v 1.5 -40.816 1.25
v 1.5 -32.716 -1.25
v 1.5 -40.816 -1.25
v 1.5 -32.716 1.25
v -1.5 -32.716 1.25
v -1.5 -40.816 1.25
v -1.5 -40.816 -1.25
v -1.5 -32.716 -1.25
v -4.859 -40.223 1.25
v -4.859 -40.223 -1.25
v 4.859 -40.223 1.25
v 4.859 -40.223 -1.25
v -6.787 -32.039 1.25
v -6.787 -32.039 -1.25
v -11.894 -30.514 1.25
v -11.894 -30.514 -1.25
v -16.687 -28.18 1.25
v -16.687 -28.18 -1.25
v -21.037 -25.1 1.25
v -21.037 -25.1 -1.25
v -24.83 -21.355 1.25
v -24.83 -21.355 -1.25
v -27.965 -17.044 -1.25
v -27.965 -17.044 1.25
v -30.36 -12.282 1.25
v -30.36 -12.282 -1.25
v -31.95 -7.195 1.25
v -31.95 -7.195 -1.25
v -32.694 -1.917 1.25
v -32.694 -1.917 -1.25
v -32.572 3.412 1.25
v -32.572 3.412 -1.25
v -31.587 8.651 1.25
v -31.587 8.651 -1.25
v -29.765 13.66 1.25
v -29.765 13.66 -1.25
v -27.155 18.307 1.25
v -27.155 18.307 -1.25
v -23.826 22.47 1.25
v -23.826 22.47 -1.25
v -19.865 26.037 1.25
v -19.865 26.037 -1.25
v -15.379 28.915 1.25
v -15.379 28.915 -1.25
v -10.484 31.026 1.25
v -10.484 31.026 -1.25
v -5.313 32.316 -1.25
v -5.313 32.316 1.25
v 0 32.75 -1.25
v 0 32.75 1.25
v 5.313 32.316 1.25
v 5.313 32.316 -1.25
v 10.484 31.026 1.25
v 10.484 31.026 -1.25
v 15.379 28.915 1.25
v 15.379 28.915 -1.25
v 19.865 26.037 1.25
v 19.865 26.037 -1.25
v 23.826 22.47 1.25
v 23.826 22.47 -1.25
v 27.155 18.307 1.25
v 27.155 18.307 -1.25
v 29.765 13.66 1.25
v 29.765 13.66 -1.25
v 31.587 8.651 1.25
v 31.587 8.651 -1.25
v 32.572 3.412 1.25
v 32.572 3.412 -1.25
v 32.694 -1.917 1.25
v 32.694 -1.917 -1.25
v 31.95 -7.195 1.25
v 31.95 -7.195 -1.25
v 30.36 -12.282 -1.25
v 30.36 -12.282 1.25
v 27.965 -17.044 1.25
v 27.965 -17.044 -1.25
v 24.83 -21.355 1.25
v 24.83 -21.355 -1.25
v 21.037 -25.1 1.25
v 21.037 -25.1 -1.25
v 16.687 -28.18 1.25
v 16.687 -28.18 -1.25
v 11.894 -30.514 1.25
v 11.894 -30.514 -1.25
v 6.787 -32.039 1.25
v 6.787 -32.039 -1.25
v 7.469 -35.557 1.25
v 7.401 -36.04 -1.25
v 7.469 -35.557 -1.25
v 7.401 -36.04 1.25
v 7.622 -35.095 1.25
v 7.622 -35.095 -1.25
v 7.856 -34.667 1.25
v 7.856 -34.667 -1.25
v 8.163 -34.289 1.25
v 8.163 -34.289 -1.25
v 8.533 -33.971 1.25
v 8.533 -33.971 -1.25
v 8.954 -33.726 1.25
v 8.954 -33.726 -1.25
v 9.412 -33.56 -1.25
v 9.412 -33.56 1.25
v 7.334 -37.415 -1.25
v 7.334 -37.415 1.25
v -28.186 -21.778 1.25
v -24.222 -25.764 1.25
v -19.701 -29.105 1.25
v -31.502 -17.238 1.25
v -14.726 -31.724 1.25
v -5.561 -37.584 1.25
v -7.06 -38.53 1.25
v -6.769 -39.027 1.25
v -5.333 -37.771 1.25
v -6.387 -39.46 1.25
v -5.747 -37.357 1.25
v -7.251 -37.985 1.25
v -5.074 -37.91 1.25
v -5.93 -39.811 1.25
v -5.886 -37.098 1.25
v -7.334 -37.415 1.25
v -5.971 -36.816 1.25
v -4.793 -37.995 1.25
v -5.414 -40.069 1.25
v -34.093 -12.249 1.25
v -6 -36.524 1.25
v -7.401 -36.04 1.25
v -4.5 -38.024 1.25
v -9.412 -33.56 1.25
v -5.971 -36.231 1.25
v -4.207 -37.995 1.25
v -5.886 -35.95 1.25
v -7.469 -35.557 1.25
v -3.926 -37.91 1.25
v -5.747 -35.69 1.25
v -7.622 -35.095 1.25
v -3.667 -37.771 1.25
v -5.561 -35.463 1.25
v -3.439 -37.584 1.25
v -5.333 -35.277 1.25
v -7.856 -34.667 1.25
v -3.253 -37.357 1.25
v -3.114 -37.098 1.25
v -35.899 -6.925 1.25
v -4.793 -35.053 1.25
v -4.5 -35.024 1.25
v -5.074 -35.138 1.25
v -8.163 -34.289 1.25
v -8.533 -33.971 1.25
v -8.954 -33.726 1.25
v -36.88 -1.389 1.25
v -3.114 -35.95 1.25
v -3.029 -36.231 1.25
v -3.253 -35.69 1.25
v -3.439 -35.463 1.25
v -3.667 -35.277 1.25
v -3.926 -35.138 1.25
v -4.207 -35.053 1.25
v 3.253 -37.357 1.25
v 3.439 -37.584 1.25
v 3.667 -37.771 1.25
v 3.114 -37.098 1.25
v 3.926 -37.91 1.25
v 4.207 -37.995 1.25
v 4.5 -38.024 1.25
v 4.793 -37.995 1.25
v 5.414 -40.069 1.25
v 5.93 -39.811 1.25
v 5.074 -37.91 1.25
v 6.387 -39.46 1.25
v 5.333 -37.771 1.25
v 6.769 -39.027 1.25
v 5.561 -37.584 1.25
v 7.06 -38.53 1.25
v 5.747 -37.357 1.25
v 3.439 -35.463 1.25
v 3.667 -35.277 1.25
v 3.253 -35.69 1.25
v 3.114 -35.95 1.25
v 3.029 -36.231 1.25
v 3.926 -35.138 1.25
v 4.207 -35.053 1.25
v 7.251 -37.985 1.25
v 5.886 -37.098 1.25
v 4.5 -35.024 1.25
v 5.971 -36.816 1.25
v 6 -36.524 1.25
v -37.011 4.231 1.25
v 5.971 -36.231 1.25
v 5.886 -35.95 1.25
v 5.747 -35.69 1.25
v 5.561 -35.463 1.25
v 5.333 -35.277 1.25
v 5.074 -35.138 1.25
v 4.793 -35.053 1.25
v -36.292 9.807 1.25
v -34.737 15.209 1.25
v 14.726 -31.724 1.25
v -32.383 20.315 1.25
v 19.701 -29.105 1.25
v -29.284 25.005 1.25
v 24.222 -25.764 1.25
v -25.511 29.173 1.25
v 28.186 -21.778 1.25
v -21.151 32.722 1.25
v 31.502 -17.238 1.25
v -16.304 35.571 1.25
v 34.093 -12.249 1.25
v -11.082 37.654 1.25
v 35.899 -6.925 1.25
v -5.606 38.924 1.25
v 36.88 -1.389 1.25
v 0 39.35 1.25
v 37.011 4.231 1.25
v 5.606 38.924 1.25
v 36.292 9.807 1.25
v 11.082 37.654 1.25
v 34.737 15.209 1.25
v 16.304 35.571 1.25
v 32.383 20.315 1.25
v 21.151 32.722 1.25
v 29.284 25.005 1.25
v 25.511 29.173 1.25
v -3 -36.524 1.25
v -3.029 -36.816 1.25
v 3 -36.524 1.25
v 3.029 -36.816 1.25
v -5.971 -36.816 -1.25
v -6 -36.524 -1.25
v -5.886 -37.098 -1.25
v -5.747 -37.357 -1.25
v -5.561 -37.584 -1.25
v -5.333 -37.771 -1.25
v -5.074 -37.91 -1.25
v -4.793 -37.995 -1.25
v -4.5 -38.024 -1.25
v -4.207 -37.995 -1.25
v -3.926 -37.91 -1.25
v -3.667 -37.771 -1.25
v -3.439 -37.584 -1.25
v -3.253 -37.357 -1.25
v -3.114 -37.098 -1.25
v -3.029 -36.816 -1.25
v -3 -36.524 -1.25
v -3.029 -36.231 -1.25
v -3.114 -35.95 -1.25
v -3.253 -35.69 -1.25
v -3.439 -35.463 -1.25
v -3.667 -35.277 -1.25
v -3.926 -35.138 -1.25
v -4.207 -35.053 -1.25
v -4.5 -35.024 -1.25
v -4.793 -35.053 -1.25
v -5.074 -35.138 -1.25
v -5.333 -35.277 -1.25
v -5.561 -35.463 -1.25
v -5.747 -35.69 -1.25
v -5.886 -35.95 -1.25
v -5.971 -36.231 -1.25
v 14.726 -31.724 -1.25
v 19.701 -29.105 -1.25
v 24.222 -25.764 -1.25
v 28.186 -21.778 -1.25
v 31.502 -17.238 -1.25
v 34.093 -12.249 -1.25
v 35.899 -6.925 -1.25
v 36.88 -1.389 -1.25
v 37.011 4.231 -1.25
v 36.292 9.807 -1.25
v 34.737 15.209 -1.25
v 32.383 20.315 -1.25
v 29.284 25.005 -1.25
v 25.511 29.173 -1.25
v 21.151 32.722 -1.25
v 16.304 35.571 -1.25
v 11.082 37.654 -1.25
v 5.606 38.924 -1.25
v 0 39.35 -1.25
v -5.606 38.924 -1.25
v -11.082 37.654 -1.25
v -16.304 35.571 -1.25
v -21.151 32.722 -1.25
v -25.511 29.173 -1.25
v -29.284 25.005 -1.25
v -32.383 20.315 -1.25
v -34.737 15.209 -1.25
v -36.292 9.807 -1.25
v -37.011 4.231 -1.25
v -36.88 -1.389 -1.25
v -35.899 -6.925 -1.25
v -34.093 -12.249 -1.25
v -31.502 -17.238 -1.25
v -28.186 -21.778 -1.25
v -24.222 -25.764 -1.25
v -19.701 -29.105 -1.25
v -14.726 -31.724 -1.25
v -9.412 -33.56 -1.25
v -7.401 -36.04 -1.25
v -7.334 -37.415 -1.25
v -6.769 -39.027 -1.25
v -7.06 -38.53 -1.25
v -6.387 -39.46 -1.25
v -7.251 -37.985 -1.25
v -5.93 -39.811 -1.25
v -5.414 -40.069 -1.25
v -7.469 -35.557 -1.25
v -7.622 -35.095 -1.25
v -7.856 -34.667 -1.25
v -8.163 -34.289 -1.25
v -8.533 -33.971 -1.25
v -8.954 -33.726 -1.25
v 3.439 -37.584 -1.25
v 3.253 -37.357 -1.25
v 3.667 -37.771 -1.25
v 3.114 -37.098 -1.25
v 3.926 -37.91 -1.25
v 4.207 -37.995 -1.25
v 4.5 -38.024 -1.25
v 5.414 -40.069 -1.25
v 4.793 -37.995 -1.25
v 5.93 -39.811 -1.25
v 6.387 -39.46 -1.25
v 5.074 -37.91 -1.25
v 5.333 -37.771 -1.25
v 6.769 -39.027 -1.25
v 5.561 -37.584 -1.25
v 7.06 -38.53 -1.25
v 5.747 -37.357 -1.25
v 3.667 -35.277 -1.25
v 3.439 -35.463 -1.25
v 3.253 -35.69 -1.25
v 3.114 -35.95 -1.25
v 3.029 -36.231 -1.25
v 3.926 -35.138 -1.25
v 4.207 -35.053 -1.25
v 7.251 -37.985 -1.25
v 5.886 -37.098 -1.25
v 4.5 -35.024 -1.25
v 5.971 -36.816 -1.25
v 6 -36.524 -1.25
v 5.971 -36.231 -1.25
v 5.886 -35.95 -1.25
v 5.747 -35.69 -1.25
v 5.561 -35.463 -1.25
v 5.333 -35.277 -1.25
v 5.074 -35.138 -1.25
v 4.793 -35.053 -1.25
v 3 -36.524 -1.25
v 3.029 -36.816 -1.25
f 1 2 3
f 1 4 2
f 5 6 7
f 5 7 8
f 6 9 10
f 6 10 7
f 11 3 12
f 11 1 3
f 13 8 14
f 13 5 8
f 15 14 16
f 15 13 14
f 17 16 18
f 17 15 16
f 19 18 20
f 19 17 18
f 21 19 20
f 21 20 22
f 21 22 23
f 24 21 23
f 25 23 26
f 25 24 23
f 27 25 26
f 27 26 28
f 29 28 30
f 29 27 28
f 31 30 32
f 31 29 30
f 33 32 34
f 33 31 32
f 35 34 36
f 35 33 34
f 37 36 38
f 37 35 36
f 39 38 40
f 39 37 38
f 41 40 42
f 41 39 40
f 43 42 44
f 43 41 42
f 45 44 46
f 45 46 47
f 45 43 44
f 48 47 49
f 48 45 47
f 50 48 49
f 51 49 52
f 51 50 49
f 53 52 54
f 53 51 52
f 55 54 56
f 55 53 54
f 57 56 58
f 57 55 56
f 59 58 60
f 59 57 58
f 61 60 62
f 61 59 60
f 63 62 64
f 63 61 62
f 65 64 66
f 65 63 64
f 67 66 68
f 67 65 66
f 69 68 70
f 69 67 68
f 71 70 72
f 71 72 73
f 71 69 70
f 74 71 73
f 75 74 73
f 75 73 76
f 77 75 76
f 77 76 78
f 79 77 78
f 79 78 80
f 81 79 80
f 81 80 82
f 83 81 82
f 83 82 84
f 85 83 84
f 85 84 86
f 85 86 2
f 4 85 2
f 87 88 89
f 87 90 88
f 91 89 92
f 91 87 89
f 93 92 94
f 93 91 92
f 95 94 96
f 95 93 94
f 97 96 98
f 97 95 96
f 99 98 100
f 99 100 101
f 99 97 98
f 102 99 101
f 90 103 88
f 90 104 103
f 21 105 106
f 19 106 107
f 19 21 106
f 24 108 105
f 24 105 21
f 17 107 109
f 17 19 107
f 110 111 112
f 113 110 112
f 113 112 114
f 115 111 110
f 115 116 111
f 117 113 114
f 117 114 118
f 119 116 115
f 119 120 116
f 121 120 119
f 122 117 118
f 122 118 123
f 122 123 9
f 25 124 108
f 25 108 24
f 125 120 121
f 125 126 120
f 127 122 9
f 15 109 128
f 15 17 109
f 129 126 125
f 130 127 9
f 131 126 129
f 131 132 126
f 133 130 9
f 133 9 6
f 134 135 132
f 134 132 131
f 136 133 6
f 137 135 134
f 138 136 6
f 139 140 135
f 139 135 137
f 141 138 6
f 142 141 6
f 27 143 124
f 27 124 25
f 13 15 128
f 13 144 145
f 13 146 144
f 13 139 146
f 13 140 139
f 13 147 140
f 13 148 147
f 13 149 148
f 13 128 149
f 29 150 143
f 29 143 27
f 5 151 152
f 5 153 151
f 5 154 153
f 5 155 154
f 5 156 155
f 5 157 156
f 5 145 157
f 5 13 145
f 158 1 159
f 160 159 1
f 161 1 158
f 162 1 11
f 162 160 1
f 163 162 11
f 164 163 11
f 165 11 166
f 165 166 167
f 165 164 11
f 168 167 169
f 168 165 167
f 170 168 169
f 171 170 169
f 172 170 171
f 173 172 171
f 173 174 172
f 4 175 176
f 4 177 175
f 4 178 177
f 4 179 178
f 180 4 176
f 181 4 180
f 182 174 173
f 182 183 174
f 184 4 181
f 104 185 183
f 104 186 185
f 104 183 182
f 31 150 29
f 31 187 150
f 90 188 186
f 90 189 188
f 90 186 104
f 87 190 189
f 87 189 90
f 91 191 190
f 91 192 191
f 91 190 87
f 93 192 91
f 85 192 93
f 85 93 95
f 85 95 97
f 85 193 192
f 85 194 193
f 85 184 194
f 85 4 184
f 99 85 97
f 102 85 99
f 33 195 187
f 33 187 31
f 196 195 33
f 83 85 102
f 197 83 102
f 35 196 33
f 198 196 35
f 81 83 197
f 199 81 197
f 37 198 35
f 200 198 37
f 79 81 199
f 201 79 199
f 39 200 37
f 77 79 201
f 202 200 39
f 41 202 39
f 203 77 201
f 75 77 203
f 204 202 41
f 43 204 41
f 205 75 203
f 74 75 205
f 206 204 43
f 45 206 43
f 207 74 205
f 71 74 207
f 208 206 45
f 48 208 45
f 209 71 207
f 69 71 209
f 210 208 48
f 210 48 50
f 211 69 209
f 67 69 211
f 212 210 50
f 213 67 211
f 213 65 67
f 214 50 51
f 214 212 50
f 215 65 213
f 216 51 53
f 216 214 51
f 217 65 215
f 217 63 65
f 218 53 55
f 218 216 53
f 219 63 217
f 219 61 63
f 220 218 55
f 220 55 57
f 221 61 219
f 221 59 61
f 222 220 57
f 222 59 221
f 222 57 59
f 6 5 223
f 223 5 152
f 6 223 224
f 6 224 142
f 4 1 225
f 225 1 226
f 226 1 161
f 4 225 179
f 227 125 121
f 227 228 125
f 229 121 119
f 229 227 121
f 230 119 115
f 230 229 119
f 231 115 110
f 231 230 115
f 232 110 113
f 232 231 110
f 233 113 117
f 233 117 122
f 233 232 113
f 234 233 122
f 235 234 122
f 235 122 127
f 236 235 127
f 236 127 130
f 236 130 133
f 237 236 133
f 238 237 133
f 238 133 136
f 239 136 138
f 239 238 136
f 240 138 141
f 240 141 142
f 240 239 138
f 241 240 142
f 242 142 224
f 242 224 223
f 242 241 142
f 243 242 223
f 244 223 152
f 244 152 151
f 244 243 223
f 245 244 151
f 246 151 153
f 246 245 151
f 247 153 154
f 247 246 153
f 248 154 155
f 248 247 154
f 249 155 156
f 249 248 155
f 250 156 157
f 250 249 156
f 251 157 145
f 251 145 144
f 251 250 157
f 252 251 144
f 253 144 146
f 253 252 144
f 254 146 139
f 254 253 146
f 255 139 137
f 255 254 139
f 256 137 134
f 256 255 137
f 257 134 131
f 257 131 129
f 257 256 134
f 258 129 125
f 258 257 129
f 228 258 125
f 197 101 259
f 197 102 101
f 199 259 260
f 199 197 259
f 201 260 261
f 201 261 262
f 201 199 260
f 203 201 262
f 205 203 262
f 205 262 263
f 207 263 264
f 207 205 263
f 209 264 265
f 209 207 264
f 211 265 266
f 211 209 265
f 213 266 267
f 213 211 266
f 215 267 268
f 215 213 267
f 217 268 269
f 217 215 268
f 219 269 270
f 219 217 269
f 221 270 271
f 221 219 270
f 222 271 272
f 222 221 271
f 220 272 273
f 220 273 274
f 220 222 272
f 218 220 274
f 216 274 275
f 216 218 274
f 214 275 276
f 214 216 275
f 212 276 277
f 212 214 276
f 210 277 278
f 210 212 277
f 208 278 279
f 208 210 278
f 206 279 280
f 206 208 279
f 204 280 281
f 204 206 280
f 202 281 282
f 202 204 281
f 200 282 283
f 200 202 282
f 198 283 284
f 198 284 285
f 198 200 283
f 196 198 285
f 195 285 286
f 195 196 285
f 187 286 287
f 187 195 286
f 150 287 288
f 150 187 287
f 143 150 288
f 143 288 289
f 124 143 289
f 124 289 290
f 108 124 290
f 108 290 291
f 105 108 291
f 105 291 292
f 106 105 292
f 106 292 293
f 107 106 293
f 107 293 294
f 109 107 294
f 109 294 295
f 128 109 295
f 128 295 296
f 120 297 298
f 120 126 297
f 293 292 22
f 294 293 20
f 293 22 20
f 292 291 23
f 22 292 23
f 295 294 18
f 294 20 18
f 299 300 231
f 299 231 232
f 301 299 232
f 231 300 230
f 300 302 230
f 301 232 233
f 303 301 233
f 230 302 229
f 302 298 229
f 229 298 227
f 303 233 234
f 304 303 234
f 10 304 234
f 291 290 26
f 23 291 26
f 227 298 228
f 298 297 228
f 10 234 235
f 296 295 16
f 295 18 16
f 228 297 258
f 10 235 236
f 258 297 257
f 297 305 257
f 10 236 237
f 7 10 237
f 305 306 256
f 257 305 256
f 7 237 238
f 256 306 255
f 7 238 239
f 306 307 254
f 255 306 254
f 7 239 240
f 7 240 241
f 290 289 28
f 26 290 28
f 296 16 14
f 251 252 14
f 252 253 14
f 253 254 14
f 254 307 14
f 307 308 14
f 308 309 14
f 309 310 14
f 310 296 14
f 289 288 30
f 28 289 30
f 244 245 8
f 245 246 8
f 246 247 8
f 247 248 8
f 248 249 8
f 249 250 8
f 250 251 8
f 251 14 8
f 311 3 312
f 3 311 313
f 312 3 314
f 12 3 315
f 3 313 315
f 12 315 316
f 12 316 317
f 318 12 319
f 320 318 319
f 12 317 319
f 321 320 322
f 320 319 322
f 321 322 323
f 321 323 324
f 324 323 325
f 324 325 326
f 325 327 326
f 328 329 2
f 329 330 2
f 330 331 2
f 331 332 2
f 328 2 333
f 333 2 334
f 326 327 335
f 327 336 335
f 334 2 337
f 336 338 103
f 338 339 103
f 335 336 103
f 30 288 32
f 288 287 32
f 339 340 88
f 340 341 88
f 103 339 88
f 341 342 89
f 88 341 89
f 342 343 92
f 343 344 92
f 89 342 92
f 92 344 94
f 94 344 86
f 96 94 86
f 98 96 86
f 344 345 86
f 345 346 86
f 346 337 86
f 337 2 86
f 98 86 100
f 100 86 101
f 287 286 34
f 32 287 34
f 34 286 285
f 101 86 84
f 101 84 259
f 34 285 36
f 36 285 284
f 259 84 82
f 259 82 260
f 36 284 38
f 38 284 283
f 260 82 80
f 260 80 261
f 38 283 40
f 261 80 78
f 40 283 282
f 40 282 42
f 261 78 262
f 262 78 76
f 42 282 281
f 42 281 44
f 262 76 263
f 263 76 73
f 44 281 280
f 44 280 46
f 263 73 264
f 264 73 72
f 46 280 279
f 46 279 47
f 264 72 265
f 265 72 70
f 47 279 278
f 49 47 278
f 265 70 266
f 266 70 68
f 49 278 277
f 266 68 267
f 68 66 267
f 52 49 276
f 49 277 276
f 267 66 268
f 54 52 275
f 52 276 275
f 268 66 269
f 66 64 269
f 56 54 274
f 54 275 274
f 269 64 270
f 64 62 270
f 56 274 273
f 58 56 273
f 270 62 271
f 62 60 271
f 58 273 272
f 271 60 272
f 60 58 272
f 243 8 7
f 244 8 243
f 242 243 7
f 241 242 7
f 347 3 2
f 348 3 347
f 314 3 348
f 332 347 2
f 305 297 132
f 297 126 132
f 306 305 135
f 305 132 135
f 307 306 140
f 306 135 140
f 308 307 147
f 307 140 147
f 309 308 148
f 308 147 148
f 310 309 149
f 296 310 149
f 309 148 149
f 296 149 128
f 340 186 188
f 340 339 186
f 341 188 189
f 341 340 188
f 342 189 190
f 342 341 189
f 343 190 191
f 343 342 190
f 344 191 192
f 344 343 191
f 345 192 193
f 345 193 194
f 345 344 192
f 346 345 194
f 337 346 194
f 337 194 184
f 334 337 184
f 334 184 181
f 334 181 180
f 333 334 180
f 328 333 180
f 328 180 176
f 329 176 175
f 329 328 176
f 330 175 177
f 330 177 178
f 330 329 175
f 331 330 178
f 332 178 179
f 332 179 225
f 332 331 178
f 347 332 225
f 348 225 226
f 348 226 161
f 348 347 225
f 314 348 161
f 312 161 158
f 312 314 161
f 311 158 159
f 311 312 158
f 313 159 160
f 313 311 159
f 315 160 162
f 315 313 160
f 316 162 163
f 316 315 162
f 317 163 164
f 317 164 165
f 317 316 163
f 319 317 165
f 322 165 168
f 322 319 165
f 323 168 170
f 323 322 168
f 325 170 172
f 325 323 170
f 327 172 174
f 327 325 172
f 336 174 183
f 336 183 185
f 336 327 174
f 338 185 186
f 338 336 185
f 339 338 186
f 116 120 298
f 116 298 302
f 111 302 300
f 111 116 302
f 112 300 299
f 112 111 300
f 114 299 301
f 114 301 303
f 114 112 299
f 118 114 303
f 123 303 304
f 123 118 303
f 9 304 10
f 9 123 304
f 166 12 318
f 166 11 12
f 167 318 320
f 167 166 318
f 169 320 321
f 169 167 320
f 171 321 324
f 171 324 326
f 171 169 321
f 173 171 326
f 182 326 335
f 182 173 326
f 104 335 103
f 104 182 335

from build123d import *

# Parameters (mm, degrees)
SKETCH_2_R      = 1.5
EXTRUDE_1_DEPTH = 1.25
FILLET_1_R      = 2.7


with BuildPart() as part:
    # 草图2 → 凸台-拉伸1 (new, symmetric)
    with BuildSketch(Plane.XY):
        with BuildLine():
            Line((7.33426448, -37.414752853), (7.5, -34.008214709))
            ThreePointArc((7.5, -34.008214709), (0, 39.35), (-7.5, -34.008214709))
            Line((-7.5, -34.008214709), (-7.33426448, -37.414752853))
            ThreePointArc((-7.33426448, -37.414752853), (-6.588395249, -39.252616986), (-4.858753275, -40.223391997))
            Line((-4.858753275, -40.223391997), (-1.5, -40.815630821))
            Line((-1.5, -40.815630821), (-1.5, -32.715630821))
            ThreePointArc((-1.5, -32.715630821), (0, 32.75), (1.5, -32.715630821))
            Line((1.5, -32.715630821), (1.5, -40.815630821))
            Line((1.5, -40.815630821), (4.858753275, -40.223391997))
            ThreePointArc((4.858753275, -40.223391997), (6.588395249, -39.252616986), (7.33426448, -37.414752853))
        make_face()
        with Locations((4.5, -36.523827839)):
            Circle(SKETCH_2_R, mode=Mode.SUBTRACT)
        with Locations(Location((-4.5, -36.523827839, 0), (0, 0, 180))):
            Circle(SKETCH_2_R, mode=Mode.SUBTRACT)
    extrude(amount=EXTRUDE_1_DEPTH, both=True)

    # 圆角1
    fillet_1_edges = [part.edges().sort_by_distance(p)[0] for p in [
        (-7.5, -34.008214709, 0),
        (7.5, -34.008214709, 0),
    ]]
    fillet(fillet_1_edges, radius=FILLET_1_R)


solid = part.part
